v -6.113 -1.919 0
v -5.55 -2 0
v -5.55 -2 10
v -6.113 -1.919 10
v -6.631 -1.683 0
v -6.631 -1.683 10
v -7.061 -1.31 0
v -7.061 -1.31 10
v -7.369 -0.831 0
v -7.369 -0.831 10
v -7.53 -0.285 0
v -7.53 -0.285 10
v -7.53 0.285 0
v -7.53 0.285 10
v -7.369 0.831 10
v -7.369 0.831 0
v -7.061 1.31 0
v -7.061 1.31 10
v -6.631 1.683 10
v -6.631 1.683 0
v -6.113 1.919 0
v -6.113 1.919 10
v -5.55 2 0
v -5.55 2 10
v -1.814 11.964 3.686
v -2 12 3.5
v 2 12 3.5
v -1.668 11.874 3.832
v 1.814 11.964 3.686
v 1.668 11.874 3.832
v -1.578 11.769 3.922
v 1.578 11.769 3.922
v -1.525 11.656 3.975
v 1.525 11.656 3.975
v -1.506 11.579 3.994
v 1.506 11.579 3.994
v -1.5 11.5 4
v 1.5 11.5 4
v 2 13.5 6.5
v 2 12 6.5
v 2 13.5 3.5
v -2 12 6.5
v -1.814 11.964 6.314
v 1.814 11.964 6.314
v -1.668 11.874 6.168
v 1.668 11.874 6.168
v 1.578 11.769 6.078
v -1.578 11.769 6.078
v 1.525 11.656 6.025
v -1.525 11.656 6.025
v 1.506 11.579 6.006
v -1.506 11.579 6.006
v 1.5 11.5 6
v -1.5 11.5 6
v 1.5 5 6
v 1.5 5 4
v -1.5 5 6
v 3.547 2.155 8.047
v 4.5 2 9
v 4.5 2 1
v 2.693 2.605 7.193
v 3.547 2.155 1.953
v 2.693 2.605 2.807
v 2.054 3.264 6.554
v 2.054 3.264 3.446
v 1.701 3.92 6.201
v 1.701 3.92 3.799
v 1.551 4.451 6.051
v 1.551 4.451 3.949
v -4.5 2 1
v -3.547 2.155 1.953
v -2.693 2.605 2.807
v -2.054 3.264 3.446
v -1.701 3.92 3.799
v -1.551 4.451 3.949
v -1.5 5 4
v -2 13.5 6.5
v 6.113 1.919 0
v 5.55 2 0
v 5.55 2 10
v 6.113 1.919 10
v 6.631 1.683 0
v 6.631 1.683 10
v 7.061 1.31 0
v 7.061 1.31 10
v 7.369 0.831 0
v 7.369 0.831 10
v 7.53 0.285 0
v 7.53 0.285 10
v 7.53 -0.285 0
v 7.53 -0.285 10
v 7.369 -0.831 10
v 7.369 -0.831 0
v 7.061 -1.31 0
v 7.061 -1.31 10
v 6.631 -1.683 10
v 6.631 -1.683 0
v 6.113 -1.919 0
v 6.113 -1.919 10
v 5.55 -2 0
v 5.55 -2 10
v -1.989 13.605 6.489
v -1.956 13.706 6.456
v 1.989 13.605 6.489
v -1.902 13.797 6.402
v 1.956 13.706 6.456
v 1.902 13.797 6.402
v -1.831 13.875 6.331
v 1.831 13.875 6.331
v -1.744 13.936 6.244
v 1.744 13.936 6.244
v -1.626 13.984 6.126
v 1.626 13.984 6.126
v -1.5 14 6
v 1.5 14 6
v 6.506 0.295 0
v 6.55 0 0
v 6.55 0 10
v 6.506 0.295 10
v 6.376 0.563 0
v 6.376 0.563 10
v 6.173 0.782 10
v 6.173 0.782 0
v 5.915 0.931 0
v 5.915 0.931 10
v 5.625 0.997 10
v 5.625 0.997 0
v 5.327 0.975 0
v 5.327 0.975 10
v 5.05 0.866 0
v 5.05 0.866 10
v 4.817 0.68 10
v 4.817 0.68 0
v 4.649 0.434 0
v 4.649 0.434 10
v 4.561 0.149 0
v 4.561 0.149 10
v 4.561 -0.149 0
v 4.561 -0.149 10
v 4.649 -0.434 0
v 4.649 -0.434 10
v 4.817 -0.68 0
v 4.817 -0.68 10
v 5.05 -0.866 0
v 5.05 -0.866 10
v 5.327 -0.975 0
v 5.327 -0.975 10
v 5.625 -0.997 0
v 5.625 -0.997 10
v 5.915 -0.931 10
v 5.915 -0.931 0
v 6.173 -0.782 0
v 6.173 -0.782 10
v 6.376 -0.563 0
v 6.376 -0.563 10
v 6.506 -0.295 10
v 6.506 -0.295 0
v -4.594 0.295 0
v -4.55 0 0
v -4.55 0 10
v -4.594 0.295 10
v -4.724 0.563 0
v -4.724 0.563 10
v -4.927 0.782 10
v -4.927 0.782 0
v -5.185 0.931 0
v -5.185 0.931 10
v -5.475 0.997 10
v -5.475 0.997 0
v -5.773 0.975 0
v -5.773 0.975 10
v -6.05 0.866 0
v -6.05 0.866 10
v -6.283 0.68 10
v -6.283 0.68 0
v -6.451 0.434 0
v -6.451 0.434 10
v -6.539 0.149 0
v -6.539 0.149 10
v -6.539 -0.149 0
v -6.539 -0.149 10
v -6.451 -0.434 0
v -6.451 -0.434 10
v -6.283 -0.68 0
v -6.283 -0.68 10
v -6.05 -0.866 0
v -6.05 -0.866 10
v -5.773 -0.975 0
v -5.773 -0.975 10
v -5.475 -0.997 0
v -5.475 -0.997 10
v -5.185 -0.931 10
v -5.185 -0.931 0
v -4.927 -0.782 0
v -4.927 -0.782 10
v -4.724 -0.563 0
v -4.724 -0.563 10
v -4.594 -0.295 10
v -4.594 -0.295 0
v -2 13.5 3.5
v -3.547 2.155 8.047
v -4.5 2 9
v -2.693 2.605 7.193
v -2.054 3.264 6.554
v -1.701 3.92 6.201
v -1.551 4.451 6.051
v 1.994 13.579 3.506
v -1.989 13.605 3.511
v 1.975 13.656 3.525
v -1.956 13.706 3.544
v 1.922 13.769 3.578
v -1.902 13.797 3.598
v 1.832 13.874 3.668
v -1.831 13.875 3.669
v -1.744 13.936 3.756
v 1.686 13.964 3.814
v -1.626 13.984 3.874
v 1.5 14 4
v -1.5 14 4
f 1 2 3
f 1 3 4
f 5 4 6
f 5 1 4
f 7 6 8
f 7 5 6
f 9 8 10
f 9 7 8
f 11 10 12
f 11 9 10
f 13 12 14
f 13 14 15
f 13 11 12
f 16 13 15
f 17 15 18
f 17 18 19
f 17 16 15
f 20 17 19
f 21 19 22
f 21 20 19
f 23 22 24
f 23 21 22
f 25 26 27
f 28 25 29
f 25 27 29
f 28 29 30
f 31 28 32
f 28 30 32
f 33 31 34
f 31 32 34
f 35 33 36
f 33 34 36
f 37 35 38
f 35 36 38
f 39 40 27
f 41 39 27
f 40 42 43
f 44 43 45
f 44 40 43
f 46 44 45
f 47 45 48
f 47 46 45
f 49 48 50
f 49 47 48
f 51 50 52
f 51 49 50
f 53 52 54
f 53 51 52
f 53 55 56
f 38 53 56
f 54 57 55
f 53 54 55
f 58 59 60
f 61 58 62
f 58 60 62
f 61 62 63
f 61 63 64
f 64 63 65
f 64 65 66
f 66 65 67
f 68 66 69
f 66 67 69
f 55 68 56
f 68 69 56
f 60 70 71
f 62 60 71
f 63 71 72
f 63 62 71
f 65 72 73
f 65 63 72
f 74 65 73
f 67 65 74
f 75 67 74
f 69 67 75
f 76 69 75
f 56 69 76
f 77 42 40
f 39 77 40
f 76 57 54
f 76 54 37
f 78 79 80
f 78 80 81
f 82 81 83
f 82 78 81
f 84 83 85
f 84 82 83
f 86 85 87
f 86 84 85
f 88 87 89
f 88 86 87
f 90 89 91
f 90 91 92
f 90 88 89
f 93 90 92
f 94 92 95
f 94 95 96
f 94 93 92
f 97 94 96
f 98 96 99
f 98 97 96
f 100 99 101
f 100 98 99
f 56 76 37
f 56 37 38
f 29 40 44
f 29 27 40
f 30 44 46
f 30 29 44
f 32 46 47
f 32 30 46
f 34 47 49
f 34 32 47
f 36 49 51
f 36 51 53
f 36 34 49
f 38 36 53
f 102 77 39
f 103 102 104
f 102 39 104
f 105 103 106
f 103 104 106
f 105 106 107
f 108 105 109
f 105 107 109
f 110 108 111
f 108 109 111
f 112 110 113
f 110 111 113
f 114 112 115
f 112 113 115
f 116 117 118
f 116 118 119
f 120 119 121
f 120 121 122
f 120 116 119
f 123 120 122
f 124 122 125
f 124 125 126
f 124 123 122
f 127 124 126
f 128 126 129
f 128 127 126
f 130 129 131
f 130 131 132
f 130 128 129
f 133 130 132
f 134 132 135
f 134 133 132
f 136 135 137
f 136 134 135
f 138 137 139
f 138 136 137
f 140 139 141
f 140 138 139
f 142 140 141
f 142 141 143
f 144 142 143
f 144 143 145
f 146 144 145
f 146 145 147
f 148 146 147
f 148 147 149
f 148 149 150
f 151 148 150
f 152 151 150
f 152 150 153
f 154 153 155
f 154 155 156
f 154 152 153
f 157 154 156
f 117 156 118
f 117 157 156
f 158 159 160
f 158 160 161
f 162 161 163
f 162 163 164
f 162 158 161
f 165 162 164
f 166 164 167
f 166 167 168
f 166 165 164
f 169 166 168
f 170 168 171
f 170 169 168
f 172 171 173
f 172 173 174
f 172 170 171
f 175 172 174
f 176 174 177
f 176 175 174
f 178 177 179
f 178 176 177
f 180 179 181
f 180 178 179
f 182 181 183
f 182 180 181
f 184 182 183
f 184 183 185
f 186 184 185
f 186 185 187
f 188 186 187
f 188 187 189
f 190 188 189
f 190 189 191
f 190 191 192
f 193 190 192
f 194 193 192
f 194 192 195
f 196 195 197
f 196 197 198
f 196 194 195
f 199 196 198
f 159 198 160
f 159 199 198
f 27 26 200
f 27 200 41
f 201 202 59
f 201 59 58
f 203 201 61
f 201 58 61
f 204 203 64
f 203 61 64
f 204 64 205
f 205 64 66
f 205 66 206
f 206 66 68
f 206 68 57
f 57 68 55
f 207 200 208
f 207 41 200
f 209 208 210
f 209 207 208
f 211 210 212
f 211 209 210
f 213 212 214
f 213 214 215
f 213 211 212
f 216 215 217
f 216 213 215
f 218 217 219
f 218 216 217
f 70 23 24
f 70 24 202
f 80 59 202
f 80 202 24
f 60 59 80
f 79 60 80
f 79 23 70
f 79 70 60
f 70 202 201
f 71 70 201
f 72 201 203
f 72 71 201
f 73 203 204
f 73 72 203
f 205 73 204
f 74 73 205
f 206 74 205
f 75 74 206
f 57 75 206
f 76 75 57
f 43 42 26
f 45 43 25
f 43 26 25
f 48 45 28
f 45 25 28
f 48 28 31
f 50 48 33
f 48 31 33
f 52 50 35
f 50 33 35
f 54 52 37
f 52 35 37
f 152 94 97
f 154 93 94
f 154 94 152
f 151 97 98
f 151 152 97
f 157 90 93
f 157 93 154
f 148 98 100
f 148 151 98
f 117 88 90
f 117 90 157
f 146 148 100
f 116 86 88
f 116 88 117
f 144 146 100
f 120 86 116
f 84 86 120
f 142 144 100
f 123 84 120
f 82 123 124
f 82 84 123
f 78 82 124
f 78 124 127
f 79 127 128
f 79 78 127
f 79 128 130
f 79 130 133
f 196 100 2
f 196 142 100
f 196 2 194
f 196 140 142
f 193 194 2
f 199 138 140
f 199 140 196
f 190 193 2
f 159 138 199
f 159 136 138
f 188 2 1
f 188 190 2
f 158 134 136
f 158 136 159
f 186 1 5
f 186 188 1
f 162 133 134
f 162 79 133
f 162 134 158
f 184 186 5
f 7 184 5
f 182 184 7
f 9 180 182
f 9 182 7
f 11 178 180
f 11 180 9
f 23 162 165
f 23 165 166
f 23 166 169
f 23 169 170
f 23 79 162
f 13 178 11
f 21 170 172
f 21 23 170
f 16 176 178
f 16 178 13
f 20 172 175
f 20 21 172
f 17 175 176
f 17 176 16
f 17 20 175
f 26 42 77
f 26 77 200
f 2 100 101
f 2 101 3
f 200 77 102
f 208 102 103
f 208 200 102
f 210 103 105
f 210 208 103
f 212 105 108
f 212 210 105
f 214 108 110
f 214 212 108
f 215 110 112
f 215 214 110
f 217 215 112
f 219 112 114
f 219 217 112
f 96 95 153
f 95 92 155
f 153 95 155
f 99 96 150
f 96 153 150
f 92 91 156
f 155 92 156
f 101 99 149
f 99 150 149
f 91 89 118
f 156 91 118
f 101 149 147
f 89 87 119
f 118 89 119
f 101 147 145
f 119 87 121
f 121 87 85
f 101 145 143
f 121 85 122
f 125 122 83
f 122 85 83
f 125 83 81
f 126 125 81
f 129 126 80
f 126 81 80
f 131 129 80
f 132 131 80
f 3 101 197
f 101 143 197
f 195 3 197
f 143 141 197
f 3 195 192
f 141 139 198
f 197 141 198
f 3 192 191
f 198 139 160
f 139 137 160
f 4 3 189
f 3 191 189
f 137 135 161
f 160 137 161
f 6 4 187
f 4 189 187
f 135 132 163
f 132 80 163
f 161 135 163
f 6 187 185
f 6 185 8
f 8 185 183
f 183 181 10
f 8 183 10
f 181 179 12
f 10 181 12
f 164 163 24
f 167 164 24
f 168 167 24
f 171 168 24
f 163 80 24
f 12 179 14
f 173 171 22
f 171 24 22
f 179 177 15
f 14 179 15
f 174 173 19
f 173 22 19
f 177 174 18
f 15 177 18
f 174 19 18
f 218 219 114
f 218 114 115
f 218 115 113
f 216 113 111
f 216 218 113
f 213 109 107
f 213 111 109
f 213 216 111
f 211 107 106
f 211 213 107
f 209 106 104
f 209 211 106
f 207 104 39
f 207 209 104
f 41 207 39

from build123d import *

# Parameters (mm, degrees)
SKETCH1_R           = 1
BOSS_EXTRUDE1_DEPTH = 10
SKETCH2_W           = 3
SKETCH2_H           = 2
BOSS_EXTRUDE2_DEPTH = 10
FILLET1_R           = 3
SKETCH3_W           = 4
SKETCH3_H           = 3
BOSS_EXTRUDE3_DEPTH = 2
FILLET2_R           = 0.5


with BuildPart() as part:
    # Sketch1 → Boss-Extrude1 (new body)
    with BuildSketch(Plane.XY):
        with BuildLine():
            Line((5.55, -2), (-5.55, -2))
            ThreePointArc((-5.55, -2), (-7.55, 0), (-5.55, 2))
            Line((-5.55, 2), (5.55, 2))
            ThreePointArc((5.55, 2), (7.55, 0), (5.55, -2))
        make_face()
        with Locations((-5.55, 0)):
            Circle(SKETCH1_R, mode=Mode.SUBTRACT)
        with Locations((5.55, 0)):
            Circle(SKETCH1_R, mode=Mode.SUBTRACT)
    extrude(amount=BOSS_EXTRUDE1_DEPTH)

    # Sketch2 → Boss-Extrude2 (add)
    with BuildSketch(Plane(origin=(0, 2, 0), x_dir=(1, 0, 0), z_dir=(0, 1, 0))):
        with Locations((0, -5)):
            Rectangle(SKETCH2_W, SKETCH2_H)
    extrude(amount=BOSS_EXTRUDE2_DEPTH)

    # Fillet1
    fillet1_edges = [part.edges().sort_by_distance(p)[0] for p in [
        (1.5, 2, 5),
        (0, 2, 4),
        (-1.5, 2, 5),
        (0, 2, 6),
    ]]
    fillet(fillet1_edges, radius=FILLET1_R)

    # Sketch3 → Boss-Extrude3 (add)
    with BuildSketch(Plane(origin=(0, 12, 0), x_dir=(1, 0, 0), z_dir=(0, 1, 0))):
        with Locations((0, -5)):
            Rectangle(SKETCH3_W, SKETCH3_H)
    extrude(amount=BOSS_EXTRUDE3_DEPTH)

    # Fillet2
    fillet2_edges = [part.edges().sort_by_distance(p)[0] for p in [
        (1.5, 12, 5),
        (0, 12, 4),
        (-1.5, 12, 5),
        (0, 12, 6),
        (-2, 14, 5),
        (0, 14, 6.5),
        (2, 14, 5),
        (0, 14, 3.5),
    ]]
    fillet(fillet2_edges, radius=FILLET2_R - 0.0001)  # a hair under: the kernel refuses the full size


solid = part.part
